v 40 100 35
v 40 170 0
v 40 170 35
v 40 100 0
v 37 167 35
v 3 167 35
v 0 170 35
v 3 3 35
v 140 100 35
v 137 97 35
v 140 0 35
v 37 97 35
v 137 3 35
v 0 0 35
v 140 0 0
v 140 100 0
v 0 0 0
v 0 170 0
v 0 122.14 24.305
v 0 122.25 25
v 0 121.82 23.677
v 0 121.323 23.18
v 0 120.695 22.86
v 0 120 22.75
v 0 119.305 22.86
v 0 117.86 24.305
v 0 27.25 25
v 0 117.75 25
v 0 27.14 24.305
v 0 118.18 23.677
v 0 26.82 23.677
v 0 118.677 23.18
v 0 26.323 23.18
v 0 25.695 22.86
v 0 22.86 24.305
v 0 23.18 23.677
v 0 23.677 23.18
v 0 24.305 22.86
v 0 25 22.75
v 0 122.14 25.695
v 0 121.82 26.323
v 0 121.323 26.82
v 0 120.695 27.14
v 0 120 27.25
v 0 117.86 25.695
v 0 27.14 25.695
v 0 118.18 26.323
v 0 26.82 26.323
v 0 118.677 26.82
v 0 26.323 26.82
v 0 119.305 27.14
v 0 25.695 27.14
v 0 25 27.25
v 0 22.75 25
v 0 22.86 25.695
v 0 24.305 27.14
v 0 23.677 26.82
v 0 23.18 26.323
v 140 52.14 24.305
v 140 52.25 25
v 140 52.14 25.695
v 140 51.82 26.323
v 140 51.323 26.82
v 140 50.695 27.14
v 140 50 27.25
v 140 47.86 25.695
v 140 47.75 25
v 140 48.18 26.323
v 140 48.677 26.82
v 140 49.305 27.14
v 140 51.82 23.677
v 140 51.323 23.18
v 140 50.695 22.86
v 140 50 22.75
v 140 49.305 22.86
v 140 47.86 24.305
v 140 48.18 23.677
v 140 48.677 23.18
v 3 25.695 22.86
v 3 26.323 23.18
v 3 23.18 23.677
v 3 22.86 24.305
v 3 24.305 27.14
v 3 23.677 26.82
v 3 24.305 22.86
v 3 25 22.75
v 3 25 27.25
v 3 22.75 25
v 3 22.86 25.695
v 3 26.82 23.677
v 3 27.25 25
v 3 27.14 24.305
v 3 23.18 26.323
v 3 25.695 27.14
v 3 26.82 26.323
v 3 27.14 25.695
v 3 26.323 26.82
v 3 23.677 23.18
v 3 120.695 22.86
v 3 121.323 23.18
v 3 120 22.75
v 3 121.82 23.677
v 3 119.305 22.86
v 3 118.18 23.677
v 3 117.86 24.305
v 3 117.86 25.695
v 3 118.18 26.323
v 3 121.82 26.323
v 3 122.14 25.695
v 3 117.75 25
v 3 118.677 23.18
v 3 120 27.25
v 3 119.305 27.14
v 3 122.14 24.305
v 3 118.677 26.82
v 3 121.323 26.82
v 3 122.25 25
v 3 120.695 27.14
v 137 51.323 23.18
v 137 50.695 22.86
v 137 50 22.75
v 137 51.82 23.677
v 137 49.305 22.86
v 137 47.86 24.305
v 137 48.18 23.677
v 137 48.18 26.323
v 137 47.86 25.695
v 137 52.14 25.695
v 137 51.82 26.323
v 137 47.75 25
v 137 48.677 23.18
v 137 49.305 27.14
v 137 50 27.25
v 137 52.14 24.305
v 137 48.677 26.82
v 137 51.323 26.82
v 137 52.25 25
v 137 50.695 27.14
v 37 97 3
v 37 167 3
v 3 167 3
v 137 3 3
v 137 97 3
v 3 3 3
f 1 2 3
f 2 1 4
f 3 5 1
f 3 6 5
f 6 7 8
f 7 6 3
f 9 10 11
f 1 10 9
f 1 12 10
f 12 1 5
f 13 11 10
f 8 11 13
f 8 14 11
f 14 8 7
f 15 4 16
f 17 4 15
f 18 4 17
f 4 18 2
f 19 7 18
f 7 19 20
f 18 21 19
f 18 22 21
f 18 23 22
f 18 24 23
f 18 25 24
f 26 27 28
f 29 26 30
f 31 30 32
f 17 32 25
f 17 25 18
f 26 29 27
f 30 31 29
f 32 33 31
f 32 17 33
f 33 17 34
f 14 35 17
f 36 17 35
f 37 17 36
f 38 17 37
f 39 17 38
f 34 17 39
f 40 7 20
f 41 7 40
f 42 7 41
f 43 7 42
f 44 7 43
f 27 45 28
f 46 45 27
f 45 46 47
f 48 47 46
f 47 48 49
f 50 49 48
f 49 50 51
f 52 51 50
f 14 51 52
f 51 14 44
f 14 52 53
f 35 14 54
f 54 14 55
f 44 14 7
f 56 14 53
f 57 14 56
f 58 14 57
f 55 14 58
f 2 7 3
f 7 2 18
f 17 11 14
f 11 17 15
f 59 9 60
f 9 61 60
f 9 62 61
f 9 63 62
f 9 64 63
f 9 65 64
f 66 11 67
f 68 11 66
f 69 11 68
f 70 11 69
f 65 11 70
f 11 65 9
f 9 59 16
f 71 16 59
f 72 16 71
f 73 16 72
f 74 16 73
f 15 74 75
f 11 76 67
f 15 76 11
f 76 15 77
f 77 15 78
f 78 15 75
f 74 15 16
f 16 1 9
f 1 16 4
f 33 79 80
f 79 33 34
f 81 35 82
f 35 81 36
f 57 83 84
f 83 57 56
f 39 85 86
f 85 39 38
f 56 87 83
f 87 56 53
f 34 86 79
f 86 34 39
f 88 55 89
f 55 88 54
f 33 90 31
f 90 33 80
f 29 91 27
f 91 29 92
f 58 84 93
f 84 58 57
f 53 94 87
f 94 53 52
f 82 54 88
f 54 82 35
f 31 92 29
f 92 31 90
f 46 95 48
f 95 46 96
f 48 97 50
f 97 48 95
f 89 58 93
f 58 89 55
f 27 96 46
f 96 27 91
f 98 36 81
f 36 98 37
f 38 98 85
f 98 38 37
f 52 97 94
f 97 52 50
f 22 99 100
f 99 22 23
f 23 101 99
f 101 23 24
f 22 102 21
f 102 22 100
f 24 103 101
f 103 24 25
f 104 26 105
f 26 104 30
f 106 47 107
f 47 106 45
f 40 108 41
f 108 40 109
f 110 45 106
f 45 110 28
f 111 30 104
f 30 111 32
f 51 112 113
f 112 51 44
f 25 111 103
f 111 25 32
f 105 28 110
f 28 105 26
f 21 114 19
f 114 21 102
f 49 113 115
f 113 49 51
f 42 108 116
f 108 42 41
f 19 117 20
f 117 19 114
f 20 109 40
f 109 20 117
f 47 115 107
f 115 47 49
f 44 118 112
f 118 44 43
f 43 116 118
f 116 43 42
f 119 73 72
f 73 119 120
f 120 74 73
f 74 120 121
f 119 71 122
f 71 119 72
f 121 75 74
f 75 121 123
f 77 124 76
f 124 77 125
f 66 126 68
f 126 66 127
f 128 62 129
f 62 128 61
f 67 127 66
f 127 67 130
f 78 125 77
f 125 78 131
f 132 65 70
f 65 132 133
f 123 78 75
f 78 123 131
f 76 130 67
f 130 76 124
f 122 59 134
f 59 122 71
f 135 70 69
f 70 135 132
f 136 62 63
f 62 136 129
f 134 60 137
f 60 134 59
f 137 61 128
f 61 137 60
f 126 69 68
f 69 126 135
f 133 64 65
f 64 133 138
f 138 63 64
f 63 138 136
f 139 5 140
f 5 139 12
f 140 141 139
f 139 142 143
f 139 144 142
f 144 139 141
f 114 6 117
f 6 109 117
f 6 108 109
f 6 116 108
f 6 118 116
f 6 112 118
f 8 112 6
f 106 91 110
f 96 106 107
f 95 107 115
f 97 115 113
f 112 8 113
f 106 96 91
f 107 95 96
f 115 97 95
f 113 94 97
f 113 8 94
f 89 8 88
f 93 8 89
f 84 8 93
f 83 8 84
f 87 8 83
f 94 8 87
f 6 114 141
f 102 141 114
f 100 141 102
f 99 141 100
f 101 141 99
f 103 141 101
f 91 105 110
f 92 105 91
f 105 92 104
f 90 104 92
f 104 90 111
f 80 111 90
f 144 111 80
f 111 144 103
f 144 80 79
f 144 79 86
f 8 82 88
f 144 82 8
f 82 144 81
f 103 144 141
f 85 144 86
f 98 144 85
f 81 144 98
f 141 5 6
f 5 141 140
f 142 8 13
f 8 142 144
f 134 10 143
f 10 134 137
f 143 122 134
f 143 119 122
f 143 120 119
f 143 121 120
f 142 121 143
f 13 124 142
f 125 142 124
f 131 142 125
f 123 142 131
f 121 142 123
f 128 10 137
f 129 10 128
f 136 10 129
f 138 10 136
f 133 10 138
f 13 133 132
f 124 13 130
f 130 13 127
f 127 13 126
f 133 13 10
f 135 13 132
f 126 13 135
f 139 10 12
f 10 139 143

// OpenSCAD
$fn= 20;

// The power cord is a little bit offset.
// So i want to cover it.

difference()
{
    union()
    {
        cube([40,170,35]);
        translate([40,0,0])
        {
            cube([100,100,35]);
        }
    }
    translate([3,3,3])
    {
        cube([34,164,35]);
    }
    translate([36,3,3])
    {
        cube([101,94,35]);
    }
    // Screwholes
    color("blue")
    rotate([0,90,0])
    {
        translate([-25,25,-5])
        {
            cylinder(d=4.5,h=20);
        }
        translate([-25,120,-5])
        {
            cylinder(d=4.5,h=20);
        }
        translate([-25,50,125])
        {
            cylinder(d=4.5,h=20);
        }
    }
}
